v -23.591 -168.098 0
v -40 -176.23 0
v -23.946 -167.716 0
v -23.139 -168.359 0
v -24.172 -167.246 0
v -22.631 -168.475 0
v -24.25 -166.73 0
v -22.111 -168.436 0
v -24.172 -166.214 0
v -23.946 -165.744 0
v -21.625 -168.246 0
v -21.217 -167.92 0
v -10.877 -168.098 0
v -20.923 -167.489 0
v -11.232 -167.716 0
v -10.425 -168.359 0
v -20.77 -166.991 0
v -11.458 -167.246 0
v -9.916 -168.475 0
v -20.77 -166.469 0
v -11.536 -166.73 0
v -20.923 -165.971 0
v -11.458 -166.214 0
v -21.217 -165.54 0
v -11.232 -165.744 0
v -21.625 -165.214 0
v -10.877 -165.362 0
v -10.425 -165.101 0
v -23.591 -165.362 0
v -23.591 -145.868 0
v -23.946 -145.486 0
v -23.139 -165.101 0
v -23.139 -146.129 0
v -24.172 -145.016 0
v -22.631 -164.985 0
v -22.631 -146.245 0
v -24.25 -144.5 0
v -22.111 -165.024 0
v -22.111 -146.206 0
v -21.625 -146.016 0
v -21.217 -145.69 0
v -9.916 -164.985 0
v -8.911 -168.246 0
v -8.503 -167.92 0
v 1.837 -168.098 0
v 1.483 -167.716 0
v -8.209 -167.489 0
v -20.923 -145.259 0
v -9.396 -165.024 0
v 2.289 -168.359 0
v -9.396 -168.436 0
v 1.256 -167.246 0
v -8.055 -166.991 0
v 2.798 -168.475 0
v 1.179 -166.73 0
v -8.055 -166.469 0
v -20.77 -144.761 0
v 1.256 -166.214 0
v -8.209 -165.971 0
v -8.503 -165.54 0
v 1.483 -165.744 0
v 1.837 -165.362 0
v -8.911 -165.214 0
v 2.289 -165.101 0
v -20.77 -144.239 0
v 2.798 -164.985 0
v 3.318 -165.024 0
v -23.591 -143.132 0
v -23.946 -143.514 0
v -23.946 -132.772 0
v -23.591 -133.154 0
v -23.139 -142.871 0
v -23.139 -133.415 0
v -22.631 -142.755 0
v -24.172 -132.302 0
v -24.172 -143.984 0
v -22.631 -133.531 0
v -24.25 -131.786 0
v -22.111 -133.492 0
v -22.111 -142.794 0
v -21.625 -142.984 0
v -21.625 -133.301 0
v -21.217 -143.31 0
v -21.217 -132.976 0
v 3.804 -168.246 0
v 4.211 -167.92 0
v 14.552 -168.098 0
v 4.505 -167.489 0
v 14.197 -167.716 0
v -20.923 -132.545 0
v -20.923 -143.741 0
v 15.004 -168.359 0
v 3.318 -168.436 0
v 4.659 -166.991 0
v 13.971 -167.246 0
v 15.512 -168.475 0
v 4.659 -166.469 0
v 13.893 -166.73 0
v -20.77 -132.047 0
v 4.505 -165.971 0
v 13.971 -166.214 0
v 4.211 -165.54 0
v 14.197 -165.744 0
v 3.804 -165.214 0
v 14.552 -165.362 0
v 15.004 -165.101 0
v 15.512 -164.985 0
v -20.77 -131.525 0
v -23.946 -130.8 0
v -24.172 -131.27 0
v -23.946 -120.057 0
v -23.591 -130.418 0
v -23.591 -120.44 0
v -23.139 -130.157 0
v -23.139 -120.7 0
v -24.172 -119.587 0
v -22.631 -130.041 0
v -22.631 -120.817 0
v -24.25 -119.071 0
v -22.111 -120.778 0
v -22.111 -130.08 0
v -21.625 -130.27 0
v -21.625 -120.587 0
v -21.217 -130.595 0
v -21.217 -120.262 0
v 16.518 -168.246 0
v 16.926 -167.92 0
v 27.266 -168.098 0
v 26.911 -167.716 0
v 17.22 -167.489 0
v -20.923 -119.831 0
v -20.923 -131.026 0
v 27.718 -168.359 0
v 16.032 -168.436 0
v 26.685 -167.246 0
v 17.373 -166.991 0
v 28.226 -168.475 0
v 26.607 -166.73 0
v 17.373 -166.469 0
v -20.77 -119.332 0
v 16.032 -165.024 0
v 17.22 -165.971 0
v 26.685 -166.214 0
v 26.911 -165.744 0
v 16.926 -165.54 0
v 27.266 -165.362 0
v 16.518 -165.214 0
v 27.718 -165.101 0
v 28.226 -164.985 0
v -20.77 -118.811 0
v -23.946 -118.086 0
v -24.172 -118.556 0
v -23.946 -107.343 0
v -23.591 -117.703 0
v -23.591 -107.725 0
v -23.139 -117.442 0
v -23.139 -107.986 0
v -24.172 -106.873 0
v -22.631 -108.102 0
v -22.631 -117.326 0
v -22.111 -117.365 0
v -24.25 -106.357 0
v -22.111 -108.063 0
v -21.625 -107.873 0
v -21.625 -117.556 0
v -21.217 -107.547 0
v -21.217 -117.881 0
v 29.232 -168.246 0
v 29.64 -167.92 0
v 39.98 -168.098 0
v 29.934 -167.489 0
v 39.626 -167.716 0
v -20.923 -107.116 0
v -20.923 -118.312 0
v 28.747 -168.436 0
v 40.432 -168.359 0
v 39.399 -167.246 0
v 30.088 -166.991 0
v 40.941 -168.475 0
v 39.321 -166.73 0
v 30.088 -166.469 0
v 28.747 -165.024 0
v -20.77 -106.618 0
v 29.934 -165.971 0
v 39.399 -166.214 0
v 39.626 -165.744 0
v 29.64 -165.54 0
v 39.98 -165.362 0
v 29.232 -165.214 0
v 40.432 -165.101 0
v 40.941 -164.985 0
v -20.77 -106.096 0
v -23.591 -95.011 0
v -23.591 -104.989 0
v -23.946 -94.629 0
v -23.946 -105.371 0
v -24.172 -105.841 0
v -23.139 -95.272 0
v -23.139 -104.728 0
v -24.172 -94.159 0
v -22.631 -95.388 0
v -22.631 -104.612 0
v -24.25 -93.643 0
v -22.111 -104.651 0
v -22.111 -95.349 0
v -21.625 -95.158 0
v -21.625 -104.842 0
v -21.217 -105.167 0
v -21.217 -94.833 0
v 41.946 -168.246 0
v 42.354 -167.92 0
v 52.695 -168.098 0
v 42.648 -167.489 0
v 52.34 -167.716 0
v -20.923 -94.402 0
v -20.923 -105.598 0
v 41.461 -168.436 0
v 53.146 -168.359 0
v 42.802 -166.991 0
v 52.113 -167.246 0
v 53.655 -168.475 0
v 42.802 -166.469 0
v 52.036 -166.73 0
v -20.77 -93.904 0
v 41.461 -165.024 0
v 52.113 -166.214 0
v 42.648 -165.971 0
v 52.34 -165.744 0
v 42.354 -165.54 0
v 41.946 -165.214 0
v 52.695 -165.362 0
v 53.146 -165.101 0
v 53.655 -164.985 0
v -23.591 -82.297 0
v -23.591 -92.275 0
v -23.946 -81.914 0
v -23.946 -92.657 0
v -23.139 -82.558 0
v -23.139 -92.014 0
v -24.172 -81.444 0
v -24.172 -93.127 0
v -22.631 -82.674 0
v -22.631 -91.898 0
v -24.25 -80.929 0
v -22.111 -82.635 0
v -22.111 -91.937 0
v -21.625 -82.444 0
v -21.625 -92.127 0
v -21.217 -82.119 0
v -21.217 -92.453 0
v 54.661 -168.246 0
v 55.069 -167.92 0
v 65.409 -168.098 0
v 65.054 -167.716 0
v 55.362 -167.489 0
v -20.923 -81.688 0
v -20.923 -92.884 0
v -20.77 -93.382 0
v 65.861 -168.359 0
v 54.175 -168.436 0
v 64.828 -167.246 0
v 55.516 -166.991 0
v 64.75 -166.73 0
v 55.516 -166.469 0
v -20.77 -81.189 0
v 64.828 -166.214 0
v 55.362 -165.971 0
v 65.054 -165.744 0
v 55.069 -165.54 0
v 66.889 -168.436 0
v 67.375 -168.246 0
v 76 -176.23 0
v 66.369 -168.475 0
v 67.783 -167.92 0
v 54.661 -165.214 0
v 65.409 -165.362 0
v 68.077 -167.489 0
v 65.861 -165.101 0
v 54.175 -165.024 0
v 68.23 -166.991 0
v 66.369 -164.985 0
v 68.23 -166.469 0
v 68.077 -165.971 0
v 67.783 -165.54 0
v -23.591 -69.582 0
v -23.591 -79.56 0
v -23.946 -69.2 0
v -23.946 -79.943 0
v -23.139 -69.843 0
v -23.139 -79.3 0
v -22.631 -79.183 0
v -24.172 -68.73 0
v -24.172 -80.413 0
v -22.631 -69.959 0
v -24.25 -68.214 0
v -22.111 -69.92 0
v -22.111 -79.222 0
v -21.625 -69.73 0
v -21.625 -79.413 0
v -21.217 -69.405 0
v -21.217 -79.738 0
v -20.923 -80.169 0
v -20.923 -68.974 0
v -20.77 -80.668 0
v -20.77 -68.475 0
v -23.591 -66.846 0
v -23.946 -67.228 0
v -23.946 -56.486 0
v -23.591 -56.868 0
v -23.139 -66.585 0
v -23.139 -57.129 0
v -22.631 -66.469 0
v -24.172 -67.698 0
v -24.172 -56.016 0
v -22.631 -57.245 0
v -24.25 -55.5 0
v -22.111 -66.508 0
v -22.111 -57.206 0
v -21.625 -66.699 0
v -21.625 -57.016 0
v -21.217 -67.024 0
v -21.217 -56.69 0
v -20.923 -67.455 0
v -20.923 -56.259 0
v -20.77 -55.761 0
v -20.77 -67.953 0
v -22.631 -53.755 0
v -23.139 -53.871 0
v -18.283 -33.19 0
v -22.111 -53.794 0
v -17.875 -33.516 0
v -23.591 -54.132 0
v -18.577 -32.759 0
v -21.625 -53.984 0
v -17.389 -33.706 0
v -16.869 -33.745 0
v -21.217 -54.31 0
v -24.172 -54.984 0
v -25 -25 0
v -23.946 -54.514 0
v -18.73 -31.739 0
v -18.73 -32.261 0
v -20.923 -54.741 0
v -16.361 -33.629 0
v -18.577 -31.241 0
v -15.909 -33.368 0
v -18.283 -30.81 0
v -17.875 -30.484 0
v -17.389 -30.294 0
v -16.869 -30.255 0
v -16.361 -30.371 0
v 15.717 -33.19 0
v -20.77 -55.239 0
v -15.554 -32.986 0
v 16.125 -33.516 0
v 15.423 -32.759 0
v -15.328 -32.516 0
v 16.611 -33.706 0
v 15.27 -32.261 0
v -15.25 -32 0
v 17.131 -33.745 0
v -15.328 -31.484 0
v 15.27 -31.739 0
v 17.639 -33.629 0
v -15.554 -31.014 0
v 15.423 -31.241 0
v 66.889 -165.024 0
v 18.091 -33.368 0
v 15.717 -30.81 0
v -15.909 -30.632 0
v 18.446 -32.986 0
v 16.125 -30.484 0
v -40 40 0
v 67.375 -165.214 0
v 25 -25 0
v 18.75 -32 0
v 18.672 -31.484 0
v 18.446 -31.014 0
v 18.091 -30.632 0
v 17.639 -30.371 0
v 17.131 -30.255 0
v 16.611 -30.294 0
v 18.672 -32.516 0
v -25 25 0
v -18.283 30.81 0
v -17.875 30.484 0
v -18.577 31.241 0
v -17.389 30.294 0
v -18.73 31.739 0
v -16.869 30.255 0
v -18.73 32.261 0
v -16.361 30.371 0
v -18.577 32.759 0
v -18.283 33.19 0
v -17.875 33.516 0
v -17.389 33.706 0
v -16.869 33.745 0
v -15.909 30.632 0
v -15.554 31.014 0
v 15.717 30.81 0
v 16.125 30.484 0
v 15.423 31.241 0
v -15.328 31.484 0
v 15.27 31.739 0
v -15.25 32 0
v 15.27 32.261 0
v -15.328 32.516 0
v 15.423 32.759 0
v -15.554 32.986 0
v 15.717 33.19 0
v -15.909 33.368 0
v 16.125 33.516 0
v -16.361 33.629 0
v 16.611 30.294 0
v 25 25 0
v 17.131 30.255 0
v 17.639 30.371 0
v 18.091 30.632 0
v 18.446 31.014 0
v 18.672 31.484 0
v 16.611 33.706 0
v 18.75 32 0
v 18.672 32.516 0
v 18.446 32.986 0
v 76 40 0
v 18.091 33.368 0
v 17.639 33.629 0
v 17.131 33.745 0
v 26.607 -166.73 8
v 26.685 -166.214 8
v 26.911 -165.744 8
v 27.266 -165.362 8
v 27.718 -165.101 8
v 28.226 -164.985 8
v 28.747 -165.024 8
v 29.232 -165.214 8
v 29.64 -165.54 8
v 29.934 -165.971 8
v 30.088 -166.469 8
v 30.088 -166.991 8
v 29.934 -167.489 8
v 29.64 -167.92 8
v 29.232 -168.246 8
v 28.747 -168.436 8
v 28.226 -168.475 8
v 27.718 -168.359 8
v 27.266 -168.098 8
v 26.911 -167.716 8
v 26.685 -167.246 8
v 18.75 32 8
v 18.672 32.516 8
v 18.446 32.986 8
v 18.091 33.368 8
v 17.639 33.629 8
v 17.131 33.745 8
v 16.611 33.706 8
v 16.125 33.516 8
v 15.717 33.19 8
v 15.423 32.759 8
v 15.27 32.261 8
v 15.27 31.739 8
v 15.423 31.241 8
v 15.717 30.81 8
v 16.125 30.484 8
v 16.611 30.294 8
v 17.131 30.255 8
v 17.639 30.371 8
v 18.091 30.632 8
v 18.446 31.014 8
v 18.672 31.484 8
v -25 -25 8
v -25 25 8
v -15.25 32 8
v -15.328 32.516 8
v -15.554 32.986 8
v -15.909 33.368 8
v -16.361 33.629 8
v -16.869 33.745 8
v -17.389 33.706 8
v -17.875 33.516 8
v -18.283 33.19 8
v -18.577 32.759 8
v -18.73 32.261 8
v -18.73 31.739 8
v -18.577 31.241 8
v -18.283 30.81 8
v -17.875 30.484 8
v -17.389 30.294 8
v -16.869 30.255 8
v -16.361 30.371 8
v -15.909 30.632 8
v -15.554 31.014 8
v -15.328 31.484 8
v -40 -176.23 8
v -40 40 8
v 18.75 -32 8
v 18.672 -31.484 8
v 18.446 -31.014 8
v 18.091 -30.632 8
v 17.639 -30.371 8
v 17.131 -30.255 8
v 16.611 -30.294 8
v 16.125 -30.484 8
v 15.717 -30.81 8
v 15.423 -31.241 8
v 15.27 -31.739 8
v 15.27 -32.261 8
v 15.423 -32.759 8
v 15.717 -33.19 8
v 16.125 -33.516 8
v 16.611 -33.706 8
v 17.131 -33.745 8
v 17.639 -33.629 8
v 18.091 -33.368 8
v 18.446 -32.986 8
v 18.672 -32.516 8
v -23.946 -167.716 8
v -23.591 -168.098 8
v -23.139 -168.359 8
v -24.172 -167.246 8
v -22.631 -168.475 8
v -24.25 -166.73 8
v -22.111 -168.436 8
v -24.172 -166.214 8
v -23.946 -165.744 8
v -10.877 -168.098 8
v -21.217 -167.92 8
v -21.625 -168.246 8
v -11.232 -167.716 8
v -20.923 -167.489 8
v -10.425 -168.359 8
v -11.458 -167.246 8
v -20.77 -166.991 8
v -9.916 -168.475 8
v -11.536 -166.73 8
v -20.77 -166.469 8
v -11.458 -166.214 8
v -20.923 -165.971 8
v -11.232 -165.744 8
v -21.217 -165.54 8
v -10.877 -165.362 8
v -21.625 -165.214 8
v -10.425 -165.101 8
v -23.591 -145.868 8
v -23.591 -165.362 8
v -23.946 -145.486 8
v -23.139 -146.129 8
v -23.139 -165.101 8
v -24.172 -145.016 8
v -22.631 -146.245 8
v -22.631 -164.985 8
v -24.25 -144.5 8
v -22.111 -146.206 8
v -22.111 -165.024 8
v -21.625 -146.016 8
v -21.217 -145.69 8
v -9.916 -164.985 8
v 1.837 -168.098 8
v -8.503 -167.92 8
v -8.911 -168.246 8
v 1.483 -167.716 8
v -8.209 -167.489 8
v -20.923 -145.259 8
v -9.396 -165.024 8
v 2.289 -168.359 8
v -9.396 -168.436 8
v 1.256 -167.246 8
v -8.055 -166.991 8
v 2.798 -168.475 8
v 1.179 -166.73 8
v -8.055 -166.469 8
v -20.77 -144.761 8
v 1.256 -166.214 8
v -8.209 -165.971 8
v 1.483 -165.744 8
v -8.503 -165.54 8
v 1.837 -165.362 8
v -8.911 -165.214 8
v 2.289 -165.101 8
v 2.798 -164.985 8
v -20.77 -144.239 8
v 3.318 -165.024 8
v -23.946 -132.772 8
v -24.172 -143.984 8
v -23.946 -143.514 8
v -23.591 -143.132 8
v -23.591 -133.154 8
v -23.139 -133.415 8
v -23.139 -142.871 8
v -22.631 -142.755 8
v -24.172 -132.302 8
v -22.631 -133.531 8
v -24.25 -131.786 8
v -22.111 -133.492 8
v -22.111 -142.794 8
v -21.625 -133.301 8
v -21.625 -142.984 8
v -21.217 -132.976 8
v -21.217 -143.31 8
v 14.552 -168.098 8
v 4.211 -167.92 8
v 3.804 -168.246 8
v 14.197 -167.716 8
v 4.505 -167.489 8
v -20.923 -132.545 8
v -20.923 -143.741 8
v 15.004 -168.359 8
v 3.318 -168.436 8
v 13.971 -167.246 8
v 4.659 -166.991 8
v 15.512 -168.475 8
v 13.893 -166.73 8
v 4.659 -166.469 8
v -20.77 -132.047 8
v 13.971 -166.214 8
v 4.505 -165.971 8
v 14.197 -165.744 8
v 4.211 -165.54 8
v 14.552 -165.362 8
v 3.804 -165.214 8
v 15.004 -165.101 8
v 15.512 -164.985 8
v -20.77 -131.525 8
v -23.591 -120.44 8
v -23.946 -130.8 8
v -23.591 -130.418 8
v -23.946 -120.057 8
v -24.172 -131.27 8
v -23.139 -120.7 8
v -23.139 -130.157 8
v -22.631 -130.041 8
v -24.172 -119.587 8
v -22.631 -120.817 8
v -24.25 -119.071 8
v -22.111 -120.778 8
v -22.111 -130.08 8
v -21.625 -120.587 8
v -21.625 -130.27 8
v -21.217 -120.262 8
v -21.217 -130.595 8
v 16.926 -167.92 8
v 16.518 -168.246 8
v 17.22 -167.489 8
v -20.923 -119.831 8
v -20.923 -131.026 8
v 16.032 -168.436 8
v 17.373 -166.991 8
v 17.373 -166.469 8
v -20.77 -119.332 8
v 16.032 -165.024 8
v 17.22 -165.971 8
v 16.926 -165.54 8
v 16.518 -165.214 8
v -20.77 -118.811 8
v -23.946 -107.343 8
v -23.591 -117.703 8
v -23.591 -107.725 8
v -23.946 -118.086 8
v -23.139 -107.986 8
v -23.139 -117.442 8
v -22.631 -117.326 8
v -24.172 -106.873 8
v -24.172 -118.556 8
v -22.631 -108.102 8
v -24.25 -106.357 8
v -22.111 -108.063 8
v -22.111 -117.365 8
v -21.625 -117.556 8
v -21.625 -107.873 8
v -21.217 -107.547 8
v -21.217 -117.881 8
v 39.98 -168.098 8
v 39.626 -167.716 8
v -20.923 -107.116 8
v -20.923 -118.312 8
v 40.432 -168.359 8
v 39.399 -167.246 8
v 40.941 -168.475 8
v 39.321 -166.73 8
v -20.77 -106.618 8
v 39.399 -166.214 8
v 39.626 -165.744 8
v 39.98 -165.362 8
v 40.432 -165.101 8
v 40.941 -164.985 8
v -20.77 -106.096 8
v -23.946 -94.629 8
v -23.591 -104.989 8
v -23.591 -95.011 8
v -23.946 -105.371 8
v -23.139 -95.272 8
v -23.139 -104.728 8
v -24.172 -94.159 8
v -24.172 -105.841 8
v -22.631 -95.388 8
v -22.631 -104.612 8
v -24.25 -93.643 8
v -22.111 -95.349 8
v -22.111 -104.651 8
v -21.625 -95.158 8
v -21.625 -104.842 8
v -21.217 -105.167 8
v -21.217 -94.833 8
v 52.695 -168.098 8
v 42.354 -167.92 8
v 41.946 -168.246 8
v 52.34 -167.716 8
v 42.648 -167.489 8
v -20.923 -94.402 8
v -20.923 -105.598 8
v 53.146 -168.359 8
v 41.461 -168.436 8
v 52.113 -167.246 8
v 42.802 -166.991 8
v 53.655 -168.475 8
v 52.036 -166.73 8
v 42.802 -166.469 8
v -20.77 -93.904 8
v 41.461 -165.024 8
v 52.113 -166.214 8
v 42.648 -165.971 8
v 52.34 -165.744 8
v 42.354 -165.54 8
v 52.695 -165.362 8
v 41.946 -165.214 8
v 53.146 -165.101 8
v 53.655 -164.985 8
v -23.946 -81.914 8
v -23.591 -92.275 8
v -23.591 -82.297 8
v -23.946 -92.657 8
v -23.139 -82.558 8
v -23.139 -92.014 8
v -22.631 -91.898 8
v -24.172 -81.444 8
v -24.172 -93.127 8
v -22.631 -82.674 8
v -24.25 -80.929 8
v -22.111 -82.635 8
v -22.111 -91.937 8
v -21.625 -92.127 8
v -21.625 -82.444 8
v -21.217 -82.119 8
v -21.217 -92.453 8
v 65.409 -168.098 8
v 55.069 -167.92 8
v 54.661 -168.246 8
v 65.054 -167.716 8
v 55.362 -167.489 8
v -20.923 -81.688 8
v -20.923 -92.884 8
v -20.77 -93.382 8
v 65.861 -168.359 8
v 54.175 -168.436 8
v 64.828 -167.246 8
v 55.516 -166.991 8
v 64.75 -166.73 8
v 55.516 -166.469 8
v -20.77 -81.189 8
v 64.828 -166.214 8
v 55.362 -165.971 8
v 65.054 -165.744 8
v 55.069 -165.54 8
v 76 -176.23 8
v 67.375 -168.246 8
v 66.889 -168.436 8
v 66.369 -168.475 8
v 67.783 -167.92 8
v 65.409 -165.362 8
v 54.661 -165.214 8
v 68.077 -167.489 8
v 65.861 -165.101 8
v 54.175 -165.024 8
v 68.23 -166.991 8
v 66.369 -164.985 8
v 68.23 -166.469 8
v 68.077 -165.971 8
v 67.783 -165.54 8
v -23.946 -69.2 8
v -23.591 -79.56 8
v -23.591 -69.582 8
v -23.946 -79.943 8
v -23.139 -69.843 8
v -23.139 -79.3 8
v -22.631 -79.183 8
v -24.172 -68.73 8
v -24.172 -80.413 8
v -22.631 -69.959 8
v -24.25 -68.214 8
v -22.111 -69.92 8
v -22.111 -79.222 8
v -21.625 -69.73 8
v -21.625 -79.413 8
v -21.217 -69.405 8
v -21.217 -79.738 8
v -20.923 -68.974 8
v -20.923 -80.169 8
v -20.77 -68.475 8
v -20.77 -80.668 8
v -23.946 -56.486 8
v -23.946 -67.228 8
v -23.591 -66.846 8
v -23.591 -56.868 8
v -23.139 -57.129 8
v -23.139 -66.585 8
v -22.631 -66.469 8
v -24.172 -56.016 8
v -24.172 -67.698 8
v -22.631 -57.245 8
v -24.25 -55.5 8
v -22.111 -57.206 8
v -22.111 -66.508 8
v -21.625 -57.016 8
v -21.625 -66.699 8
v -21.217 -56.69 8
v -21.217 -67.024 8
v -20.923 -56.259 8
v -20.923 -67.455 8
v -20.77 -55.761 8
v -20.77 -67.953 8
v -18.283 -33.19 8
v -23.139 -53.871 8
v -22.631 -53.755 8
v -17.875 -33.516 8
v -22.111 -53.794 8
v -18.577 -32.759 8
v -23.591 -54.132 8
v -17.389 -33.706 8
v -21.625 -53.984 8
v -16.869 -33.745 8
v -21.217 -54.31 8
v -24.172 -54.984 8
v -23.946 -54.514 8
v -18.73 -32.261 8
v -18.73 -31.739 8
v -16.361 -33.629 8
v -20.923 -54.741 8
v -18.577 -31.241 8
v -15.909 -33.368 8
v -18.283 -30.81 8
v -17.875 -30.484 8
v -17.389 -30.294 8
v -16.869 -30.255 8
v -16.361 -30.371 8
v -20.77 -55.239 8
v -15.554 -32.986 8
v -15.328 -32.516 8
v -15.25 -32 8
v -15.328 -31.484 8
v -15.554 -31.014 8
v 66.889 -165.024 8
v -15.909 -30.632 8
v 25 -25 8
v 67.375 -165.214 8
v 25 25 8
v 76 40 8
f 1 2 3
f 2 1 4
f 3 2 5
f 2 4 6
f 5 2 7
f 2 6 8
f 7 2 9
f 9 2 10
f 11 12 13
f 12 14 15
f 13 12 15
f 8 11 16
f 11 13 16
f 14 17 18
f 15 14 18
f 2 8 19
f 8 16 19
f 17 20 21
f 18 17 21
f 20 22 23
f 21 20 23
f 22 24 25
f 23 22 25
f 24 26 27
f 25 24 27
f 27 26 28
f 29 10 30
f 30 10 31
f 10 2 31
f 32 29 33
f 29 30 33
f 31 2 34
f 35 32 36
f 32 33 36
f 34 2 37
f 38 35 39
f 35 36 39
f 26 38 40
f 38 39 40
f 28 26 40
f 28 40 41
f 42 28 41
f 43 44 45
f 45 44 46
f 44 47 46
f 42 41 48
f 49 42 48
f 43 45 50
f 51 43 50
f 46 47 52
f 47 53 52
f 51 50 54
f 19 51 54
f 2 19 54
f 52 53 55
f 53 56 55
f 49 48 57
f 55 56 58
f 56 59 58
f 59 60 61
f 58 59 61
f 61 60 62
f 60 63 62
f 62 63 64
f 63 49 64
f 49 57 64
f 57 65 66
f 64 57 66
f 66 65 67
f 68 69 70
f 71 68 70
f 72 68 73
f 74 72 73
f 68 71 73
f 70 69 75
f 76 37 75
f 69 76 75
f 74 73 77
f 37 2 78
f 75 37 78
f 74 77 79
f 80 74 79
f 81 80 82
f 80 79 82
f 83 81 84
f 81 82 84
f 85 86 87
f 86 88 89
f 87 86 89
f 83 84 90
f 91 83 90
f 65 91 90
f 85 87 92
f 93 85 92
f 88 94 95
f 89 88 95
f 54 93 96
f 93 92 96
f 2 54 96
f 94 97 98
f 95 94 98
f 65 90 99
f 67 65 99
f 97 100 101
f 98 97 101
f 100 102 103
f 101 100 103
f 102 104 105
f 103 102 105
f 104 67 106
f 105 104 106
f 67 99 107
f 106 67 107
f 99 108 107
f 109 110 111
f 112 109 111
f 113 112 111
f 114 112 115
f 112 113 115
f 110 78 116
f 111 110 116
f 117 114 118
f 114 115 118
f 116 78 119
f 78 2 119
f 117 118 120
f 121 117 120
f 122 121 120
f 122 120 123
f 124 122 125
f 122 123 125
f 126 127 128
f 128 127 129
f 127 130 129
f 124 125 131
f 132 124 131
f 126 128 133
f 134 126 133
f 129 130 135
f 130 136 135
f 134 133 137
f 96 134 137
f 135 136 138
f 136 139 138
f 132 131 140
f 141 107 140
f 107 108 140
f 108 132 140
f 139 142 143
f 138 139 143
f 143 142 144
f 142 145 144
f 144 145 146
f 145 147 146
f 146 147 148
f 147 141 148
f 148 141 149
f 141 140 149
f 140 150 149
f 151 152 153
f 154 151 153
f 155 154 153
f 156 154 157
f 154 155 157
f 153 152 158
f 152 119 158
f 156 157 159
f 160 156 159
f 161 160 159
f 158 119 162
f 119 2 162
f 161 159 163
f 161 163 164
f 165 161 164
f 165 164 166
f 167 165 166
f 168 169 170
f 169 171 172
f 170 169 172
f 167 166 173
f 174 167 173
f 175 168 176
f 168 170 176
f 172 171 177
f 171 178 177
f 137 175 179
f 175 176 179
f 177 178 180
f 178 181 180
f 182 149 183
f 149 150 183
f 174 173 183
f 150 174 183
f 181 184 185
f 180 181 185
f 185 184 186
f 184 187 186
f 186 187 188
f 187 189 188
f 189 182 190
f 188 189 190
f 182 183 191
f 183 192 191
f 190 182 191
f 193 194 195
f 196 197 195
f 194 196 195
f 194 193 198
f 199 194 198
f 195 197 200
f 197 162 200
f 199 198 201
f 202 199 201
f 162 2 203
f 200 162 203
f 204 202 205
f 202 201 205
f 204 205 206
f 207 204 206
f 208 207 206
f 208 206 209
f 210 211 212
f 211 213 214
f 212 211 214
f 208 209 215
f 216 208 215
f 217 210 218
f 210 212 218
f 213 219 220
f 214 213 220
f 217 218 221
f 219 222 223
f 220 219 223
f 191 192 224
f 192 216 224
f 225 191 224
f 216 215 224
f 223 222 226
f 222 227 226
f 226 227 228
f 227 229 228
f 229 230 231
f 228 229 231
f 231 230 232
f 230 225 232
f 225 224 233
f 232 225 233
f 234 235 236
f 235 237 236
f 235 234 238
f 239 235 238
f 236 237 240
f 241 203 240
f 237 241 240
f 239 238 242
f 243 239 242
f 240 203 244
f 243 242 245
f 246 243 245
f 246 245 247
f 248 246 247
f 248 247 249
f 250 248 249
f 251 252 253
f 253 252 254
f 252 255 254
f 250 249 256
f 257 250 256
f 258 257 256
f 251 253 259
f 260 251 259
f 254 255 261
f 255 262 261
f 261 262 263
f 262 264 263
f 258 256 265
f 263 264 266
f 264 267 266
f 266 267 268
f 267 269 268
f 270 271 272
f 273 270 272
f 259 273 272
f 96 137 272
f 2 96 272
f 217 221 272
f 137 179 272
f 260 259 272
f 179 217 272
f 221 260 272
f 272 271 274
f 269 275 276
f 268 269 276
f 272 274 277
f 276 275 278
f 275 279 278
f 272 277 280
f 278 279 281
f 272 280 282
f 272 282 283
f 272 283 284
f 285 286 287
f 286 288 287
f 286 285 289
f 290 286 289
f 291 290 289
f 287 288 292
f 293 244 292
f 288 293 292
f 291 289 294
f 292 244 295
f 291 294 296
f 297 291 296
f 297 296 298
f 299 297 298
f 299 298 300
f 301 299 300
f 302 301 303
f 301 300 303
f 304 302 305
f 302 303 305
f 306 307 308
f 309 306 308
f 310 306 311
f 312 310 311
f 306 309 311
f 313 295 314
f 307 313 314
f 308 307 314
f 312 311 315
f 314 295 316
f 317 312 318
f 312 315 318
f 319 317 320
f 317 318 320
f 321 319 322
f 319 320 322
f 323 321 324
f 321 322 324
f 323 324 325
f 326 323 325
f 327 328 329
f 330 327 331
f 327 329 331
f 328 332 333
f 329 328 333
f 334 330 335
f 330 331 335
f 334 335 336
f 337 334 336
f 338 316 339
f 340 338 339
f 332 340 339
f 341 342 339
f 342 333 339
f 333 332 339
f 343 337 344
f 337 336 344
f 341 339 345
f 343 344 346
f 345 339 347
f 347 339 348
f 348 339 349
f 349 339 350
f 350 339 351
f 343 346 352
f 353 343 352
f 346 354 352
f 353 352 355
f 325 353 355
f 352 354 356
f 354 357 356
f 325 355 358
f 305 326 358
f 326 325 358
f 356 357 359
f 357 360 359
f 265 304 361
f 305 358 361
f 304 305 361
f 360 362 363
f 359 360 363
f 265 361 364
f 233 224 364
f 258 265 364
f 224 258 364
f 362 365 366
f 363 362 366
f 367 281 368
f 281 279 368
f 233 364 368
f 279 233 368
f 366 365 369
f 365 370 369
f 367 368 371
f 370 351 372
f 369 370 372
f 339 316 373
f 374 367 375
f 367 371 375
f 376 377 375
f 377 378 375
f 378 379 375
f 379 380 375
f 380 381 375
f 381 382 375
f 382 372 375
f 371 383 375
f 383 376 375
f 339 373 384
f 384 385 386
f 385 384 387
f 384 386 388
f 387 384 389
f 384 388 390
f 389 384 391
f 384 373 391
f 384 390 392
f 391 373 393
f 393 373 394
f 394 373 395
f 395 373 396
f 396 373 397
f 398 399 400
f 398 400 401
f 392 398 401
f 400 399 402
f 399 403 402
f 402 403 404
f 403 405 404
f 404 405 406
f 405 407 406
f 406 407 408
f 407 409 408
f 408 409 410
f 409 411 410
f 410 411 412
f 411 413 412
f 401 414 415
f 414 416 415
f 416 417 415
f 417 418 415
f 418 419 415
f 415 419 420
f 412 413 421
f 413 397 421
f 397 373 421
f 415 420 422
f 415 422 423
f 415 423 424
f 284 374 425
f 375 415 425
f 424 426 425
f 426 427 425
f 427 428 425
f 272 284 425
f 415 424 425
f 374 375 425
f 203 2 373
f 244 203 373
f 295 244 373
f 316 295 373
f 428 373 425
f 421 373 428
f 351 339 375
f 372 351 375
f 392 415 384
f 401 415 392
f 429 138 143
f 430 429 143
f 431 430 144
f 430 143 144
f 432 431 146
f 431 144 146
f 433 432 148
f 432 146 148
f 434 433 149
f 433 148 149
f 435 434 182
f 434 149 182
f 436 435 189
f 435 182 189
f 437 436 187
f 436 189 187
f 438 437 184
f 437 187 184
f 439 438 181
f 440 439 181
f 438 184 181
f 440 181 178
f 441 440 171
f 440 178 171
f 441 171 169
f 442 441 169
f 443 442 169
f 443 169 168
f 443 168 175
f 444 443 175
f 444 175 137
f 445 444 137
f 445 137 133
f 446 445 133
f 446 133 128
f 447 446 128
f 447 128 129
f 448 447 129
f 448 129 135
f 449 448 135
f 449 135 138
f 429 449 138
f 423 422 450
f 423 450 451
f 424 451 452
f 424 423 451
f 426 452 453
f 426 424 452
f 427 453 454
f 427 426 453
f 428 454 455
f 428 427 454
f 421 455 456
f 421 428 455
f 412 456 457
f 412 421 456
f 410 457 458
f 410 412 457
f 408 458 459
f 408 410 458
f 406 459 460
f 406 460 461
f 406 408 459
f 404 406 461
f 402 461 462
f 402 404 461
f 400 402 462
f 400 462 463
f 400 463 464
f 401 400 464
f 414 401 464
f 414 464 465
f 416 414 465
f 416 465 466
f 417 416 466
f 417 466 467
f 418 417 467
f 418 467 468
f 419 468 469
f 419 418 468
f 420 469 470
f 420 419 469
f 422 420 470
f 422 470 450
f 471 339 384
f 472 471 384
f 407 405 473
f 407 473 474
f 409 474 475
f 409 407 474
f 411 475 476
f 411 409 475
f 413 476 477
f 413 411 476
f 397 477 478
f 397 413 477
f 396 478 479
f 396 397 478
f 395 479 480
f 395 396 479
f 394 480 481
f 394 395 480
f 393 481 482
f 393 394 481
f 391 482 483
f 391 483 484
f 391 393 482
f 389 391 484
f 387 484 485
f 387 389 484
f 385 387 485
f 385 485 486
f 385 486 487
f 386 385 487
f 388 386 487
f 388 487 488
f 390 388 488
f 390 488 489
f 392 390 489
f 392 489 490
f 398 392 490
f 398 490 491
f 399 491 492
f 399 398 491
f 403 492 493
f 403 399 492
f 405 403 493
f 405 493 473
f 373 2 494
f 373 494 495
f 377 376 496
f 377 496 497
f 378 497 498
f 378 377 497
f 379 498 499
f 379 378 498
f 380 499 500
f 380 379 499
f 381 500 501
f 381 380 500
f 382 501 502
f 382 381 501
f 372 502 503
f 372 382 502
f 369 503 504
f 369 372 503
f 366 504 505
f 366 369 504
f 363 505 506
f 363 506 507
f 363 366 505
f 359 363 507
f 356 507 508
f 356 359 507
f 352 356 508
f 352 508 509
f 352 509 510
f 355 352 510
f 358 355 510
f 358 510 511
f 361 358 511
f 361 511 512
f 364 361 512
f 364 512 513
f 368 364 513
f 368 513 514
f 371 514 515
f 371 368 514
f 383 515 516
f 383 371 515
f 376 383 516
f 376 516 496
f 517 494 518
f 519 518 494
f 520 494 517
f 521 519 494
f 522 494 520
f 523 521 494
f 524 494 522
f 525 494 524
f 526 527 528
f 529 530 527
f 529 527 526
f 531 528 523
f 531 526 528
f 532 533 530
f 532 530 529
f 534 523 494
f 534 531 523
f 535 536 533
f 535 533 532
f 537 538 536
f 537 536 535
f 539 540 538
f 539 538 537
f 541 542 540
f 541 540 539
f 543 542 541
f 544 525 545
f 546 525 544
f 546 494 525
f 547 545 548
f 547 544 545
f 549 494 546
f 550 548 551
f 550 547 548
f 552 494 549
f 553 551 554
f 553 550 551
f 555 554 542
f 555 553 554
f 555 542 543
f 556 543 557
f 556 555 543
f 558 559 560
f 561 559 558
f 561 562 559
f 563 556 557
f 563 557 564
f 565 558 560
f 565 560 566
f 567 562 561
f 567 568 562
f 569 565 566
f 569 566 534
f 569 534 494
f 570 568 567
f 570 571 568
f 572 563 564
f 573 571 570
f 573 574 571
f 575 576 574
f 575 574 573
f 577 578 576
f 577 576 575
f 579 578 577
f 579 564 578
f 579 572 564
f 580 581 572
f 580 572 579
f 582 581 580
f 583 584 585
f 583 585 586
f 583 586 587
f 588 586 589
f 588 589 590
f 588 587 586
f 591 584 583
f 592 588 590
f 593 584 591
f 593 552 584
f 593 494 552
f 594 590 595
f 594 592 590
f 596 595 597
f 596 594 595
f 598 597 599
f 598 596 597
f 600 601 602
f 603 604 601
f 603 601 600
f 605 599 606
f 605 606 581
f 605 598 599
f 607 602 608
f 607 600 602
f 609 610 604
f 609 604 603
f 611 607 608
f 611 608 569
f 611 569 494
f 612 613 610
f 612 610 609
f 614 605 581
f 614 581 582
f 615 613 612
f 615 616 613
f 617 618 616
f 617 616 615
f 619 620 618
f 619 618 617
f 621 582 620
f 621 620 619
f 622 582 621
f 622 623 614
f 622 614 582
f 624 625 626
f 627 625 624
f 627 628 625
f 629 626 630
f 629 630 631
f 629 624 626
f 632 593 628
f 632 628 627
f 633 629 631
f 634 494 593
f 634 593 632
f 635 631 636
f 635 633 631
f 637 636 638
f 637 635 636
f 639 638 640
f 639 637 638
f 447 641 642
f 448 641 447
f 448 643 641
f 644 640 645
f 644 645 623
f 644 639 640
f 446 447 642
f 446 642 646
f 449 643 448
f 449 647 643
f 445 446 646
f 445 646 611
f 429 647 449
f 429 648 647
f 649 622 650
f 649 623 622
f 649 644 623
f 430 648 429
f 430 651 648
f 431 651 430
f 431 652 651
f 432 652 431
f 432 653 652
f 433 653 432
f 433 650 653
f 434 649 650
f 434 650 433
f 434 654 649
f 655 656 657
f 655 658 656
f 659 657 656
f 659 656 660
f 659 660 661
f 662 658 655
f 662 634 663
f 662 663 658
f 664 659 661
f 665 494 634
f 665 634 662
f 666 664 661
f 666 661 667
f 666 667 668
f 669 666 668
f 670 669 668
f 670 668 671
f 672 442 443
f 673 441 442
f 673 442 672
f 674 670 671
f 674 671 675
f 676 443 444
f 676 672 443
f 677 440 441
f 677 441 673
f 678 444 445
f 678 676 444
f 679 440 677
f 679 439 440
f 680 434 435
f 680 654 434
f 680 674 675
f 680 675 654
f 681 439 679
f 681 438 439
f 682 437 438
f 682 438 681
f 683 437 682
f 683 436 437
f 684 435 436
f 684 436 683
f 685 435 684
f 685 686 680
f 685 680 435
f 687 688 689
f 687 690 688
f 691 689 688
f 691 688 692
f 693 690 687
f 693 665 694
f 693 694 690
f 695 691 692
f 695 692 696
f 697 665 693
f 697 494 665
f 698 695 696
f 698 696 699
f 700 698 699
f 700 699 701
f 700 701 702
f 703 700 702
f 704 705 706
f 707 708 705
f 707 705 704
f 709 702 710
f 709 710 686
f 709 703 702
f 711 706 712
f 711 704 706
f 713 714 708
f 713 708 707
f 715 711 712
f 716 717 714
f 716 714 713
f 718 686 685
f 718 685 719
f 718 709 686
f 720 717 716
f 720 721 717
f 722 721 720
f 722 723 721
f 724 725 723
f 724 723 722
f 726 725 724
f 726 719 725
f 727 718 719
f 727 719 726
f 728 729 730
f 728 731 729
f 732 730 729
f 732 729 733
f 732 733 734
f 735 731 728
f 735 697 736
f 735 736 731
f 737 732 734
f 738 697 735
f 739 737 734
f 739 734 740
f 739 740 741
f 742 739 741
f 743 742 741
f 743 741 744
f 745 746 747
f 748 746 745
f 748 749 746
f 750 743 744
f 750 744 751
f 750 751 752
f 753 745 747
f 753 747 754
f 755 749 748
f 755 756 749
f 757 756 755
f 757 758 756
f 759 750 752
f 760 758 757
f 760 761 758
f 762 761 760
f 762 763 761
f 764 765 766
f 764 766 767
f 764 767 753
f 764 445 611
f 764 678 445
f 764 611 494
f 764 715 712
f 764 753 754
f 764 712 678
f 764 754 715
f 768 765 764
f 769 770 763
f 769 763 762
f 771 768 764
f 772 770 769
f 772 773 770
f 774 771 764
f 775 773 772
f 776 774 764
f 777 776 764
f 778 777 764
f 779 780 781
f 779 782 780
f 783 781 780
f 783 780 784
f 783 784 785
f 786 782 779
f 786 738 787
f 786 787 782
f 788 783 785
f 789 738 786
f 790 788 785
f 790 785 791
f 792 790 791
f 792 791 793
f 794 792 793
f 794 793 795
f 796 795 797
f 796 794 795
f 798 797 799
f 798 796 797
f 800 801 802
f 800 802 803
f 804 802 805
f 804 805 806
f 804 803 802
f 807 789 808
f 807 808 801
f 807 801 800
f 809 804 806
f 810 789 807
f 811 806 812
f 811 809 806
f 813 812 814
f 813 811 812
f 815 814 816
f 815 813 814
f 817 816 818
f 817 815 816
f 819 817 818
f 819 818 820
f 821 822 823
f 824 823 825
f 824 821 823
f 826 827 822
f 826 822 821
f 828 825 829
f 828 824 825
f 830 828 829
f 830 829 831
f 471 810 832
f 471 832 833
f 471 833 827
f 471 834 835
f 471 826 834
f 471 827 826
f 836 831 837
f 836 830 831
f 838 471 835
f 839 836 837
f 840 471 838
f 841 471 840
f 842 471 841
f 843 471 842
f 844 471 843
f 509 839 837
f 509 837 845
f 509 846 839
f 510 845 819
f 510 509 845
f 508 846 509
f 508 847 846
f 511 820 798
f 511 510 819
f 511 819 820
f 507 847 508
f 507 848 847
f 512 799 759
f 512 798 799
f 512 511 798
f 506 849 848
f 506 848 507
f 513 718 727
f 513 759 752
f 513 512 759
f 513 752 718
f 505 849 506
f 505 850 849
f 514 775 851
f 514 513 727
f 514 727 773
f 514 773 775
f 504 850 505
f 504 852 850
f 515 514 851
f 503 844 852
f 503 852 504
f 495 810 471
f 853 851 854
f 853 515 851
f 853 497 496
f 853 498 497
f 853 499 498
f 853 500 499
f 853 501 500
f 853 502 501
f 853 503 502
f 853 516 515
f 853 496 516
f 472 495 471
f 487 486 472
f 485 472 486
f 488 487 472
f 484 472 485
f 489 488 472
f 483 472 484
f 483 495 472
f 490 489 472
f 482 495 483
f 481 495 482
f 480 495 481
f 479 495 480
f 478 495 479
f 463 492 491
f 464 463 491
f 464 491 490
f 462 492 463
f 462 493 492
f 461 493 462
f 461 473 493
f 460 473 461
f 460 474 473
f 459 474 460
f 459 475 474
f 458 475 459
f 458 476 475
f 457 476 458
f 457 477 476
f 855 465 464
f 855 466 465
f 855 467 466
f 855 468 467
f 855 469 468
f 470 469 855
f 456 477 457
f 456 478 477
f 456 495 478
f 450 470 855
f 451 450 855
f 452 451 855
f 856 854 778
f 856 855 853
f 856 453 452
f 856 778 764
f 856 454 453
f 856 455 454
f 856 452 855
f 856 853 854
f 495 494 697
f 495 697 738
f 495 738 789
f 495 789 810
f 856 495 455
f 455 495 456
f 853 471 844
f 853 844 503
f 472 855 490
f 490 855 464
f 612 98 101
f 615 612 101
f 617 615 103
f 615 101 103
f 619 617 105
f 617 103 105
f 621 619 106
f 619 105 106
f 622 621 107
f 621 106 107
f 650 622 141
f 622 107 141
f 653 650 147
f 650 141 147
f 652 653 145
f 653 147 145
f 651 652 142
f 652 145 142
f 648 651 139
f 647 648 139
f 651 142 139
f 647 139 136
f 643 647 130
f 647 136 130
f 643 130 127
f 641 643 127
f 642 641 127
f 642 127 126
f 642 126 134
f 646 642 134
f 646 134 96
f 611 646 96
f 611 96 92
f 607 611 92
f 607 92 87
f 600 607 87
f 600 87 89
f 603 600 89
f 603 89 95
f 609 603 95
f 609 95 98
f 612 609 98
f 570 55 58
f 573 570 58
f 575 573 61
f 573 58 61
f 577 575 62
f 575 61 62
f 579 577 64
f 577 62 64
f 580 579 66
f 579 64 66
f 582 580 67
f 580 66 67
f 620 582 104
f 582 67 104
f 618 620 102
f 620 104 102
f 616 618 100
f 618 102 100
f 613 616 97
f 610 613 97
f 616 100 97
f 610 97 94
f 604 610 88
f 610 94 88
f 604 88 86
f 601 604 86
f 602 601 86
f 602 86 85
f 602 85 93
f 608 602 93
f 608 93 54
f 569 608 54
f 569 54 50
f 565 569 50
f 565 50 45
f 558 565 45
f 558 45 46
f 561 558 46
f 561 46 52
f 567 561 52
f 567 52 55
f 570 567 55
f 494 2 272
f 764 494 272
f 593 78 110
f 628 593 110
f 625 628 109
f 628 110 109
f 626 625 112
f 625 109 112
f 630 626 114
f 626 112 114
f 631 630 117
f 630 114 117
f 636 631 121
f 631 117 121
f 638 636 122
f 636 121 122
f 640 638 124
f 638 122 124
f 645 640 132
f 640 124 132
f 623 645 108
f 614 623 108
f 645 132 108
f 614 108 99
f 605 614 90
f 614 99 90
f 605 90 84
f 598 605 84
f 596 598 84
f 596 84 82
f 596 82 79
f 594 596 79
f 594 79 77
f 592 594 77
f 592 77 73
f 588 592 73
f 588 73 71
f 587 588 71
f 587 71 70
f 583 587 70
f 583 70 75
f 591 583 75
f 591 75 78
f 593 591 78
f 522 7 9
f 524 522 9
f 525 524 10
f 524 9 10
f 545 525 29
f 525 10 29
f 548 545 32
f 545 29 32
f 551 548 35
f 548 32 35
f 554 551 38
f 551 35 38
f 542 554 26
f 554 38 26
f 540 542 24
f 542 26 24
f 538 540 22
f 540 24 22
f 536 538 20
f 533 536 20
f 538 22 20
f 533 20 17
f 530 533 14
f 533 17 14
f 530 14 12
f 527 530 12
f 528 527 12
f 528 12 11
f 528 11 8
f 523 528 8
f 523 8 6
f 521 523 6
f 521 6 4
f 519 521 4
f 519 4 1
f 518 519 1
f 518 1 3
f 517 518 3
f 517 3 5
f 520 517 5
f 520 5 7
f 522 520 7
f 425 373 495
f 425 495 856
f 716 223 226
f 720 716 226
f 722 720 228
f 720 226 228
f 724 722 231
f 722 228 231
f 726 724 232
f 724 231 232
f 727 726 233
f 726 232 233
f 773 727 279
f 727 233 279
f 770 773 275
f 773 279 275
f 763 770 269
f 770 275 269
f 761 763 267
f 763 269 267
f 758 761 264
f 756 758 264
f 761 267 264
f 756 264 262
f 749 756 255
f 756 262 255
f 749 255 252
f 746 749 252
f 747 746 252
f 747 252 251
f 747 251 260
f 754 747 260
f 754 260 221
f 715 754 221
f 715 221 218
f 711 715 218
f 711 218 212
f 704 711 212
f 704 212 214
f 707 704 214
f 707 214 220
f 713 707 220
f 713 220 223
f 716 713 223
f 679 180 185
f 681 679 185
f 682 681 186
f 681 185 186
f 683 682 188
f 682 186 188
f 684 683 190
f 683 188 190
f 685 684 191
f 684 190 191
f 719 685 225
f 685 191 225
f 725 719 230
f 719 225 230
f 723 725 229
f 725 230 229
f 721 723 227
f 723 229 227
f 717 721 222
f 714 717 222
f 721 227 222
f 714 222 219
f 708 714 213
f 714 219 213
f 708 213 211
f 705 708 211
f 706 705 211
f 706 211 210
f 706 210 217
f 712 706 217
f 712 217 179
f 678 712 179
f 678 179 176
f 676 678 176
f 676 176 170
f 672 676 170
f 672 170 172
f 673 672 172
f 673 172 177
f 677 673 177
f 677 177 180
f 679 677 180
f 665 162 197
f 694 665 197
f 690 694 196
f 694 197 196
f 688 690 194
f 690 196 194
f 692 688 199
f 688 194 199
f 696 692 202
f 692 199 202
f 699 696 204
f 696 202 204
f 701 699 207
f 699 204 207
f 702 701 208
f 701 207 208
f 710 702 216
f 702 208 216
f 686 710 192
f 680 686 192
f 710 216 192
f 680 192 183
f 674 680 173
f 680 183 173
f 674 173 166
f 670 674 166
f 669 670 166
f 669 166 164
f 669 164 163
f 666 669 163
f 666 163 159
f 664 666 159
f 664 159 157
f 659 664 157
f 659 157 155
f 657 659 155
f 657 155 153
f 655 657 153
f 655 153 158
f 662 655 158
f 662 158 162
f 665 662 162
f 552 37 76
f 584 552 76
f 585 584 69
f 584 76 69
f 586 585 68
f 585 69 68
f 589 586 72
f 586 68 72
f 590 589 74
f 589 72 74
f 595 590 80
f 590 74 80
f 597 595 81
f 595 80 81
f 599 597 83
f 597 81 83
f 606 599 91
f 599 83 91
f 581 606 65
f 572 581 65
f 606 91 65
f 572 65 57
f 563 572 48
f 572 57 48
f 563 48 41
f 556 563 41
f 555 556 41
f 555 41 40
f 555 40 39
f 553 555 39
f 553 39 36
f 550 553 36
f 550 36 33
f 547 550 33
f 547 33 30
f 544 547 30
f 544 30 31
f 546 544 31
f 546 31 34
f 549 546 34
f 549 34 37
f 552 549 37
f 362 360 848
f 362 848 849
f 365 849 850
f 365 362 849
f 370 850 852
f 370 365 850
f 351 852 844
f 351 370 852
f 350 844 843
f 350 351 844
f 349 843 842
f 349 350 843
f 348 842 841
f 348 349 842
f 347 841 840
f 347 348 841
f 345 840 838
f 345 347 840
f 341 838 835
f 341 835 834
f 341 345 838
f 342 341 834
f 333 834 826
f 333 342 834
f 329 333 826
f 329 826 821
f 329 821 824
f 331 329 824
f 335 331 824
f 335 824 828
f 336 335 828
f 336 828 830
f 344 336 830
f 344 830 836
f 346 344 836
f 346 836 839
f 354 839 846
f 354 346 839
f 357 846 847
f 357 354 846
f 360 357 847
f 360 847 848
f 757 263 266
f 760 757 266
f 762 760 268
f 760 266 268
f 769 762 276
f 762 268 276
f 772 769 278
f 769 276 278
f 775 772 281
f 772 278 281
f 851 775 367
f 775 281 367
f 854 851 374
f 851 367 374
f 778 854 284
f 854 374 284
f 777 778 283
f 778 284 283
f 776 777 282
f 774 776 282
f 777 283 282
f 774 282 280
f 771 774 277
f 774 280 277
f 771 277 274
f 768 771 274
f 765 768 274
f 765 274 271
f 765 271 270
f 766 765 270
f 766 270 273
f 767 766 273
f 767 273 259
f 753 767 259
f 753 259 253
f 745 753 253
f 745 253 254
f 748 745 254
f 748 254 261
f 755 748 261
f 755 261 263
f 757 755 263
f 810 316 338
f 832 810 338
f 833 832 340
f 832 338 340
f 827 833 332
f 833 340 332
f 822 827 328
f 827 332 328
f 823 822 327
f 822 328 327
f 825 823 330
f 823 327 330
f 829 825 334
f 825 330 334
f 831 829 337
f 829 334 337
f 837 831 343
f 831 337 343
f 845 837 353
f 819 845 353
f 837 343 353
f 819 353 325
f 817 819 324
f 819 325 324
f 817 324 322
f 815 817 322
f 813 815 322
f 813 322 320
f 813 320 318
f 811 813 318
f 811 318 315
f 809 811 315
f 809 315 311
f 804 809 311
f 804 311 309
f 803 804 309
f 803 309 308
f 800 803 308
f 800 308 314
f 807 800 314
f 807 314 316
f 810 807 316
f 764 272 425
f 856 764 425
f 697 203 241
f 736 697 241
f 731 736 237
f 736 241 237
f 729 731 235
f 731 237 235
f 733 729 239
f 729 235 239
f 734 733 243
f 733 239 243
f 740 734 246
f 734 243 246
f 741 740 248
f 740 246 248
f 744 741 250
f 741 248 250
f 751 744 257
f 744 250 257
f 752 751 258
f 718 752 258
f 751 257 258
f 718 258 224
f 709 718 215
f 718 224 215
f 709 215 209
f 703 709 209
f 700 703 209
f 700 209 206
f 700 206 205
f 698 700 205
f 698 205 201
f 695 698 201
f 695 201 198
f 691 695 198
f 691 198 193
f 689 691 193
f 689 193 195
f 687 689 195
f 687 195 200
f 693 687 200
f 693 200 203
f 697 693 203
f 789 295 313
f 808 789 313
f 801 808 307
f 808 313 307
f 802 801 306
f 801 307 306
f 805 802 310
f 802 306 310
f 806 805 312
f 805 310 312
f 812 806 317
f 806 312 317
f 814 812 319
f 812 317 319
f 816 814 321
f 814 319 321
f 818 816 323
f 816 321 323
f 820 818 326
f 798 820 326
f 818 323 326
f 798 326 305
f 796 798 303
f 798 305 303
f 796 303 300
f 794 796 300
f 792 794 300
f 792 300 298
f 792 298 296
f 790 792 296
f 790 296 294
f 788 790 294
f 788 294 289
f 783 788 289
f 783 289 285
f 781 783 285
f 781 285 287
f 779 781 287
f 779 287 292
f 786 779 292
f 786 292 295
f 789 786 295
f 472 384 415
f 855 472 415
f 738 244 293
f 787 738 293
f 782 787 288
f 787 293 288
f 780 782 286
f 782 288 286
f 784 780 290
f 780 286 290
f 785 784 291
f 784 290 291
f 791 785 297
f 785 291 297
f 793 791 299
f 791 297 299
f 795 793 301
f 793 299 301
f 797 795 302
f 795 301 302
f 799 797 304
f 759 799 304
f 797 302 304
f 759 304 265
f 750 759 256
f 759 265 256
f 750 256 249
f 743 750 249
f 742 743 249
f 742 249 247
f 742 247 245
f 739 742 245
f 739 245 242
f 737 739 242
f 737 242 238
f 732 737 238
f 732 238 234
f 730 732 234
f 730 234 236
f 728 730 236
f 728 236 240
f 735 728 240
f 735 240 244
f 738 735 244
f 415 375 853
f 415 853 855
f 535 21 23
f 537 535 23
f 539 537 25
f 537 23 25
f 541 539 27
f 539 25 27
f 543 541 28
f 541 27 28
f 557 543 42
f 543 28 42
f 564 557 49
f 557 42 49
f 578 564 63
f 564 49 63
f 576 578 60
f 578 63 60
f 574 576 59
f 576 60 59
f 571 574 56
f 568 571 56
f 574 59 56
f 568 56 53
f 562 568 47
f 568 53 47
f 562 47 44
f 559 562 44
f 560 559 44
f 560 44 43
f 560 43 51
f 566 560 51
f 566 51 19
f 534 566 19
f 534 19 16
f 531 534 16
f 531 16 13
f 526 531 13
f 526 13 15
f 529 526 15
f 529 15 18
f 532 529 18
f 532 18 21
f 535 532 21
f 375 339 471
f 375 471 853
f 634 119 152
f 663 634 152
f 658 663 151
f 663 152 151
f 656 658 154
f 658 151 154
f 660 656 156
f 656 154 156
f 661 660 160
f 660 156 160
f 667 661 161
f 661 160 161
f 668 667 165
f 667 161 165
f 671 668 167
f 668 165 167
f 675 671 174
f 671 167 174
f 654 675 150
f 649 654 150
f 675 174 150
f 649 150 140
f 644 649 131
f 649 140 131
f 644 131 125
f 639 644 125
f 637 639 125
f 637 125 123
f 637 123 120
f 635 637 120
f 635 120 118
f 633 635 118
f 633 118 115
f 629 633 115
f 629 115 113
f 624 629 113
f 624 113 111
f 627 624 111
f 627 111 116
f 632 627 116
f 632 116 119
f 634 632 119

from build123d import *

# Parameters (mm, degrees)
ESBO_O1_W                = 116
ESBO_O1_H                = 216.23
ESBO_O1_R                = 1.75
ESBO_O1_W_2              = 50
ESBO_O1_H_2              = 50
RESSALTO_EXTRUS_O2_DEPTH = 8
ESBO_O2_R                = 1.75
CORTE_EXTRUS_O1_DEPTH    = 100
PADR_O_LINEAR1_COUNT     = 8
PADR_O_LINEAR1_PITCH     = 12.714285714
ESBO_O3_R                = 1.75
CORTE_EXTRUS_O2_DEPTH    = 100
PADR_O_LINEAR2_COUNT     = 8
PADR_O_LINEAR2_PITCH     = 12.714285714


with BuildPart() as part:
    # Esboço1 → Ressalto-extrusão2 (new body)
    with BuildSketch(Plane.XY):
        with Locations((18, -68.115)):
            Rectangle(ESBO_O1_W, ESBO_O1_H)
        with Locations((-17, 32)):
            Circle(ESBO_O1_R, mode=Mode.SUBTRACT)
        with Locations((17, 32)):
            Circle(ESBO_O1_R, mode=Mode.SUBTRACT)
        with Locations((-17, -32)):
            Circle(ESBO_O1_R, mode=Mode.SUBTRACT)
        with Locations((17, -32)):
            Circle(ESBO_O1_R, mode=Mode.SUBTRACT)
        Rectangle(ESBO_O1_W_2, ESBO_O1_H_2, mode=Mode.SUBTRACT)
    extrude(amount=RESSALTO_EXTRUS_O2_DEPTH)

    # Esboço2 → Corte-extrusão1 (cut)
    with BuildSketch(Plane(origin=(0, 0, 0), x_dir=(-1, 0, 0), z_dir=(0, 0, -1))):
        with Locations((-66.5, -166.73)):
            Circle(ESBO_O2_R)
    corte_extrus_o1 = extrude(amount=-CORTE_EXTRUS_O1_DEPTH, mode=Mode.SUBTRACT)

    # Padrão linear1: Corte-extrusão1 ×8
    with Locations(*[(-i * PADR_O_LINEAR1_PITCH, 0, 0) for i in range(1, PADR_O_LINEAR1_COUNT)]):
        add(corte_extrus_o1, mode=Mode.SUBTRACT)

    # Esboço3 → Corte-extrusão2 (cut)
    with BuildSketch(Plane(origin=(0, 0, 0), x_dir=(-1, 0, 0), z_dir=(0, 0, -1))):
        with Locations((22.5, -55.5)):
            Circle(ESBO_O3_R)
    corte_extrus_o2 = extrude(amount=-CORTE_EXTRUS_O2_DEPTH, mode=Mode.SUBTRACT)

    # Padrão linear2: Corte-extrusão2 ×8
    with Locations(*[(0, -i * PADR_O_LINEAR2_PITCH, 0) for i in range(1, PADR_O_LINEAR2_COUNT)]):
        add(corte_extrus_o2, mode=Mode.SUBTRACT)


solid = part.part
